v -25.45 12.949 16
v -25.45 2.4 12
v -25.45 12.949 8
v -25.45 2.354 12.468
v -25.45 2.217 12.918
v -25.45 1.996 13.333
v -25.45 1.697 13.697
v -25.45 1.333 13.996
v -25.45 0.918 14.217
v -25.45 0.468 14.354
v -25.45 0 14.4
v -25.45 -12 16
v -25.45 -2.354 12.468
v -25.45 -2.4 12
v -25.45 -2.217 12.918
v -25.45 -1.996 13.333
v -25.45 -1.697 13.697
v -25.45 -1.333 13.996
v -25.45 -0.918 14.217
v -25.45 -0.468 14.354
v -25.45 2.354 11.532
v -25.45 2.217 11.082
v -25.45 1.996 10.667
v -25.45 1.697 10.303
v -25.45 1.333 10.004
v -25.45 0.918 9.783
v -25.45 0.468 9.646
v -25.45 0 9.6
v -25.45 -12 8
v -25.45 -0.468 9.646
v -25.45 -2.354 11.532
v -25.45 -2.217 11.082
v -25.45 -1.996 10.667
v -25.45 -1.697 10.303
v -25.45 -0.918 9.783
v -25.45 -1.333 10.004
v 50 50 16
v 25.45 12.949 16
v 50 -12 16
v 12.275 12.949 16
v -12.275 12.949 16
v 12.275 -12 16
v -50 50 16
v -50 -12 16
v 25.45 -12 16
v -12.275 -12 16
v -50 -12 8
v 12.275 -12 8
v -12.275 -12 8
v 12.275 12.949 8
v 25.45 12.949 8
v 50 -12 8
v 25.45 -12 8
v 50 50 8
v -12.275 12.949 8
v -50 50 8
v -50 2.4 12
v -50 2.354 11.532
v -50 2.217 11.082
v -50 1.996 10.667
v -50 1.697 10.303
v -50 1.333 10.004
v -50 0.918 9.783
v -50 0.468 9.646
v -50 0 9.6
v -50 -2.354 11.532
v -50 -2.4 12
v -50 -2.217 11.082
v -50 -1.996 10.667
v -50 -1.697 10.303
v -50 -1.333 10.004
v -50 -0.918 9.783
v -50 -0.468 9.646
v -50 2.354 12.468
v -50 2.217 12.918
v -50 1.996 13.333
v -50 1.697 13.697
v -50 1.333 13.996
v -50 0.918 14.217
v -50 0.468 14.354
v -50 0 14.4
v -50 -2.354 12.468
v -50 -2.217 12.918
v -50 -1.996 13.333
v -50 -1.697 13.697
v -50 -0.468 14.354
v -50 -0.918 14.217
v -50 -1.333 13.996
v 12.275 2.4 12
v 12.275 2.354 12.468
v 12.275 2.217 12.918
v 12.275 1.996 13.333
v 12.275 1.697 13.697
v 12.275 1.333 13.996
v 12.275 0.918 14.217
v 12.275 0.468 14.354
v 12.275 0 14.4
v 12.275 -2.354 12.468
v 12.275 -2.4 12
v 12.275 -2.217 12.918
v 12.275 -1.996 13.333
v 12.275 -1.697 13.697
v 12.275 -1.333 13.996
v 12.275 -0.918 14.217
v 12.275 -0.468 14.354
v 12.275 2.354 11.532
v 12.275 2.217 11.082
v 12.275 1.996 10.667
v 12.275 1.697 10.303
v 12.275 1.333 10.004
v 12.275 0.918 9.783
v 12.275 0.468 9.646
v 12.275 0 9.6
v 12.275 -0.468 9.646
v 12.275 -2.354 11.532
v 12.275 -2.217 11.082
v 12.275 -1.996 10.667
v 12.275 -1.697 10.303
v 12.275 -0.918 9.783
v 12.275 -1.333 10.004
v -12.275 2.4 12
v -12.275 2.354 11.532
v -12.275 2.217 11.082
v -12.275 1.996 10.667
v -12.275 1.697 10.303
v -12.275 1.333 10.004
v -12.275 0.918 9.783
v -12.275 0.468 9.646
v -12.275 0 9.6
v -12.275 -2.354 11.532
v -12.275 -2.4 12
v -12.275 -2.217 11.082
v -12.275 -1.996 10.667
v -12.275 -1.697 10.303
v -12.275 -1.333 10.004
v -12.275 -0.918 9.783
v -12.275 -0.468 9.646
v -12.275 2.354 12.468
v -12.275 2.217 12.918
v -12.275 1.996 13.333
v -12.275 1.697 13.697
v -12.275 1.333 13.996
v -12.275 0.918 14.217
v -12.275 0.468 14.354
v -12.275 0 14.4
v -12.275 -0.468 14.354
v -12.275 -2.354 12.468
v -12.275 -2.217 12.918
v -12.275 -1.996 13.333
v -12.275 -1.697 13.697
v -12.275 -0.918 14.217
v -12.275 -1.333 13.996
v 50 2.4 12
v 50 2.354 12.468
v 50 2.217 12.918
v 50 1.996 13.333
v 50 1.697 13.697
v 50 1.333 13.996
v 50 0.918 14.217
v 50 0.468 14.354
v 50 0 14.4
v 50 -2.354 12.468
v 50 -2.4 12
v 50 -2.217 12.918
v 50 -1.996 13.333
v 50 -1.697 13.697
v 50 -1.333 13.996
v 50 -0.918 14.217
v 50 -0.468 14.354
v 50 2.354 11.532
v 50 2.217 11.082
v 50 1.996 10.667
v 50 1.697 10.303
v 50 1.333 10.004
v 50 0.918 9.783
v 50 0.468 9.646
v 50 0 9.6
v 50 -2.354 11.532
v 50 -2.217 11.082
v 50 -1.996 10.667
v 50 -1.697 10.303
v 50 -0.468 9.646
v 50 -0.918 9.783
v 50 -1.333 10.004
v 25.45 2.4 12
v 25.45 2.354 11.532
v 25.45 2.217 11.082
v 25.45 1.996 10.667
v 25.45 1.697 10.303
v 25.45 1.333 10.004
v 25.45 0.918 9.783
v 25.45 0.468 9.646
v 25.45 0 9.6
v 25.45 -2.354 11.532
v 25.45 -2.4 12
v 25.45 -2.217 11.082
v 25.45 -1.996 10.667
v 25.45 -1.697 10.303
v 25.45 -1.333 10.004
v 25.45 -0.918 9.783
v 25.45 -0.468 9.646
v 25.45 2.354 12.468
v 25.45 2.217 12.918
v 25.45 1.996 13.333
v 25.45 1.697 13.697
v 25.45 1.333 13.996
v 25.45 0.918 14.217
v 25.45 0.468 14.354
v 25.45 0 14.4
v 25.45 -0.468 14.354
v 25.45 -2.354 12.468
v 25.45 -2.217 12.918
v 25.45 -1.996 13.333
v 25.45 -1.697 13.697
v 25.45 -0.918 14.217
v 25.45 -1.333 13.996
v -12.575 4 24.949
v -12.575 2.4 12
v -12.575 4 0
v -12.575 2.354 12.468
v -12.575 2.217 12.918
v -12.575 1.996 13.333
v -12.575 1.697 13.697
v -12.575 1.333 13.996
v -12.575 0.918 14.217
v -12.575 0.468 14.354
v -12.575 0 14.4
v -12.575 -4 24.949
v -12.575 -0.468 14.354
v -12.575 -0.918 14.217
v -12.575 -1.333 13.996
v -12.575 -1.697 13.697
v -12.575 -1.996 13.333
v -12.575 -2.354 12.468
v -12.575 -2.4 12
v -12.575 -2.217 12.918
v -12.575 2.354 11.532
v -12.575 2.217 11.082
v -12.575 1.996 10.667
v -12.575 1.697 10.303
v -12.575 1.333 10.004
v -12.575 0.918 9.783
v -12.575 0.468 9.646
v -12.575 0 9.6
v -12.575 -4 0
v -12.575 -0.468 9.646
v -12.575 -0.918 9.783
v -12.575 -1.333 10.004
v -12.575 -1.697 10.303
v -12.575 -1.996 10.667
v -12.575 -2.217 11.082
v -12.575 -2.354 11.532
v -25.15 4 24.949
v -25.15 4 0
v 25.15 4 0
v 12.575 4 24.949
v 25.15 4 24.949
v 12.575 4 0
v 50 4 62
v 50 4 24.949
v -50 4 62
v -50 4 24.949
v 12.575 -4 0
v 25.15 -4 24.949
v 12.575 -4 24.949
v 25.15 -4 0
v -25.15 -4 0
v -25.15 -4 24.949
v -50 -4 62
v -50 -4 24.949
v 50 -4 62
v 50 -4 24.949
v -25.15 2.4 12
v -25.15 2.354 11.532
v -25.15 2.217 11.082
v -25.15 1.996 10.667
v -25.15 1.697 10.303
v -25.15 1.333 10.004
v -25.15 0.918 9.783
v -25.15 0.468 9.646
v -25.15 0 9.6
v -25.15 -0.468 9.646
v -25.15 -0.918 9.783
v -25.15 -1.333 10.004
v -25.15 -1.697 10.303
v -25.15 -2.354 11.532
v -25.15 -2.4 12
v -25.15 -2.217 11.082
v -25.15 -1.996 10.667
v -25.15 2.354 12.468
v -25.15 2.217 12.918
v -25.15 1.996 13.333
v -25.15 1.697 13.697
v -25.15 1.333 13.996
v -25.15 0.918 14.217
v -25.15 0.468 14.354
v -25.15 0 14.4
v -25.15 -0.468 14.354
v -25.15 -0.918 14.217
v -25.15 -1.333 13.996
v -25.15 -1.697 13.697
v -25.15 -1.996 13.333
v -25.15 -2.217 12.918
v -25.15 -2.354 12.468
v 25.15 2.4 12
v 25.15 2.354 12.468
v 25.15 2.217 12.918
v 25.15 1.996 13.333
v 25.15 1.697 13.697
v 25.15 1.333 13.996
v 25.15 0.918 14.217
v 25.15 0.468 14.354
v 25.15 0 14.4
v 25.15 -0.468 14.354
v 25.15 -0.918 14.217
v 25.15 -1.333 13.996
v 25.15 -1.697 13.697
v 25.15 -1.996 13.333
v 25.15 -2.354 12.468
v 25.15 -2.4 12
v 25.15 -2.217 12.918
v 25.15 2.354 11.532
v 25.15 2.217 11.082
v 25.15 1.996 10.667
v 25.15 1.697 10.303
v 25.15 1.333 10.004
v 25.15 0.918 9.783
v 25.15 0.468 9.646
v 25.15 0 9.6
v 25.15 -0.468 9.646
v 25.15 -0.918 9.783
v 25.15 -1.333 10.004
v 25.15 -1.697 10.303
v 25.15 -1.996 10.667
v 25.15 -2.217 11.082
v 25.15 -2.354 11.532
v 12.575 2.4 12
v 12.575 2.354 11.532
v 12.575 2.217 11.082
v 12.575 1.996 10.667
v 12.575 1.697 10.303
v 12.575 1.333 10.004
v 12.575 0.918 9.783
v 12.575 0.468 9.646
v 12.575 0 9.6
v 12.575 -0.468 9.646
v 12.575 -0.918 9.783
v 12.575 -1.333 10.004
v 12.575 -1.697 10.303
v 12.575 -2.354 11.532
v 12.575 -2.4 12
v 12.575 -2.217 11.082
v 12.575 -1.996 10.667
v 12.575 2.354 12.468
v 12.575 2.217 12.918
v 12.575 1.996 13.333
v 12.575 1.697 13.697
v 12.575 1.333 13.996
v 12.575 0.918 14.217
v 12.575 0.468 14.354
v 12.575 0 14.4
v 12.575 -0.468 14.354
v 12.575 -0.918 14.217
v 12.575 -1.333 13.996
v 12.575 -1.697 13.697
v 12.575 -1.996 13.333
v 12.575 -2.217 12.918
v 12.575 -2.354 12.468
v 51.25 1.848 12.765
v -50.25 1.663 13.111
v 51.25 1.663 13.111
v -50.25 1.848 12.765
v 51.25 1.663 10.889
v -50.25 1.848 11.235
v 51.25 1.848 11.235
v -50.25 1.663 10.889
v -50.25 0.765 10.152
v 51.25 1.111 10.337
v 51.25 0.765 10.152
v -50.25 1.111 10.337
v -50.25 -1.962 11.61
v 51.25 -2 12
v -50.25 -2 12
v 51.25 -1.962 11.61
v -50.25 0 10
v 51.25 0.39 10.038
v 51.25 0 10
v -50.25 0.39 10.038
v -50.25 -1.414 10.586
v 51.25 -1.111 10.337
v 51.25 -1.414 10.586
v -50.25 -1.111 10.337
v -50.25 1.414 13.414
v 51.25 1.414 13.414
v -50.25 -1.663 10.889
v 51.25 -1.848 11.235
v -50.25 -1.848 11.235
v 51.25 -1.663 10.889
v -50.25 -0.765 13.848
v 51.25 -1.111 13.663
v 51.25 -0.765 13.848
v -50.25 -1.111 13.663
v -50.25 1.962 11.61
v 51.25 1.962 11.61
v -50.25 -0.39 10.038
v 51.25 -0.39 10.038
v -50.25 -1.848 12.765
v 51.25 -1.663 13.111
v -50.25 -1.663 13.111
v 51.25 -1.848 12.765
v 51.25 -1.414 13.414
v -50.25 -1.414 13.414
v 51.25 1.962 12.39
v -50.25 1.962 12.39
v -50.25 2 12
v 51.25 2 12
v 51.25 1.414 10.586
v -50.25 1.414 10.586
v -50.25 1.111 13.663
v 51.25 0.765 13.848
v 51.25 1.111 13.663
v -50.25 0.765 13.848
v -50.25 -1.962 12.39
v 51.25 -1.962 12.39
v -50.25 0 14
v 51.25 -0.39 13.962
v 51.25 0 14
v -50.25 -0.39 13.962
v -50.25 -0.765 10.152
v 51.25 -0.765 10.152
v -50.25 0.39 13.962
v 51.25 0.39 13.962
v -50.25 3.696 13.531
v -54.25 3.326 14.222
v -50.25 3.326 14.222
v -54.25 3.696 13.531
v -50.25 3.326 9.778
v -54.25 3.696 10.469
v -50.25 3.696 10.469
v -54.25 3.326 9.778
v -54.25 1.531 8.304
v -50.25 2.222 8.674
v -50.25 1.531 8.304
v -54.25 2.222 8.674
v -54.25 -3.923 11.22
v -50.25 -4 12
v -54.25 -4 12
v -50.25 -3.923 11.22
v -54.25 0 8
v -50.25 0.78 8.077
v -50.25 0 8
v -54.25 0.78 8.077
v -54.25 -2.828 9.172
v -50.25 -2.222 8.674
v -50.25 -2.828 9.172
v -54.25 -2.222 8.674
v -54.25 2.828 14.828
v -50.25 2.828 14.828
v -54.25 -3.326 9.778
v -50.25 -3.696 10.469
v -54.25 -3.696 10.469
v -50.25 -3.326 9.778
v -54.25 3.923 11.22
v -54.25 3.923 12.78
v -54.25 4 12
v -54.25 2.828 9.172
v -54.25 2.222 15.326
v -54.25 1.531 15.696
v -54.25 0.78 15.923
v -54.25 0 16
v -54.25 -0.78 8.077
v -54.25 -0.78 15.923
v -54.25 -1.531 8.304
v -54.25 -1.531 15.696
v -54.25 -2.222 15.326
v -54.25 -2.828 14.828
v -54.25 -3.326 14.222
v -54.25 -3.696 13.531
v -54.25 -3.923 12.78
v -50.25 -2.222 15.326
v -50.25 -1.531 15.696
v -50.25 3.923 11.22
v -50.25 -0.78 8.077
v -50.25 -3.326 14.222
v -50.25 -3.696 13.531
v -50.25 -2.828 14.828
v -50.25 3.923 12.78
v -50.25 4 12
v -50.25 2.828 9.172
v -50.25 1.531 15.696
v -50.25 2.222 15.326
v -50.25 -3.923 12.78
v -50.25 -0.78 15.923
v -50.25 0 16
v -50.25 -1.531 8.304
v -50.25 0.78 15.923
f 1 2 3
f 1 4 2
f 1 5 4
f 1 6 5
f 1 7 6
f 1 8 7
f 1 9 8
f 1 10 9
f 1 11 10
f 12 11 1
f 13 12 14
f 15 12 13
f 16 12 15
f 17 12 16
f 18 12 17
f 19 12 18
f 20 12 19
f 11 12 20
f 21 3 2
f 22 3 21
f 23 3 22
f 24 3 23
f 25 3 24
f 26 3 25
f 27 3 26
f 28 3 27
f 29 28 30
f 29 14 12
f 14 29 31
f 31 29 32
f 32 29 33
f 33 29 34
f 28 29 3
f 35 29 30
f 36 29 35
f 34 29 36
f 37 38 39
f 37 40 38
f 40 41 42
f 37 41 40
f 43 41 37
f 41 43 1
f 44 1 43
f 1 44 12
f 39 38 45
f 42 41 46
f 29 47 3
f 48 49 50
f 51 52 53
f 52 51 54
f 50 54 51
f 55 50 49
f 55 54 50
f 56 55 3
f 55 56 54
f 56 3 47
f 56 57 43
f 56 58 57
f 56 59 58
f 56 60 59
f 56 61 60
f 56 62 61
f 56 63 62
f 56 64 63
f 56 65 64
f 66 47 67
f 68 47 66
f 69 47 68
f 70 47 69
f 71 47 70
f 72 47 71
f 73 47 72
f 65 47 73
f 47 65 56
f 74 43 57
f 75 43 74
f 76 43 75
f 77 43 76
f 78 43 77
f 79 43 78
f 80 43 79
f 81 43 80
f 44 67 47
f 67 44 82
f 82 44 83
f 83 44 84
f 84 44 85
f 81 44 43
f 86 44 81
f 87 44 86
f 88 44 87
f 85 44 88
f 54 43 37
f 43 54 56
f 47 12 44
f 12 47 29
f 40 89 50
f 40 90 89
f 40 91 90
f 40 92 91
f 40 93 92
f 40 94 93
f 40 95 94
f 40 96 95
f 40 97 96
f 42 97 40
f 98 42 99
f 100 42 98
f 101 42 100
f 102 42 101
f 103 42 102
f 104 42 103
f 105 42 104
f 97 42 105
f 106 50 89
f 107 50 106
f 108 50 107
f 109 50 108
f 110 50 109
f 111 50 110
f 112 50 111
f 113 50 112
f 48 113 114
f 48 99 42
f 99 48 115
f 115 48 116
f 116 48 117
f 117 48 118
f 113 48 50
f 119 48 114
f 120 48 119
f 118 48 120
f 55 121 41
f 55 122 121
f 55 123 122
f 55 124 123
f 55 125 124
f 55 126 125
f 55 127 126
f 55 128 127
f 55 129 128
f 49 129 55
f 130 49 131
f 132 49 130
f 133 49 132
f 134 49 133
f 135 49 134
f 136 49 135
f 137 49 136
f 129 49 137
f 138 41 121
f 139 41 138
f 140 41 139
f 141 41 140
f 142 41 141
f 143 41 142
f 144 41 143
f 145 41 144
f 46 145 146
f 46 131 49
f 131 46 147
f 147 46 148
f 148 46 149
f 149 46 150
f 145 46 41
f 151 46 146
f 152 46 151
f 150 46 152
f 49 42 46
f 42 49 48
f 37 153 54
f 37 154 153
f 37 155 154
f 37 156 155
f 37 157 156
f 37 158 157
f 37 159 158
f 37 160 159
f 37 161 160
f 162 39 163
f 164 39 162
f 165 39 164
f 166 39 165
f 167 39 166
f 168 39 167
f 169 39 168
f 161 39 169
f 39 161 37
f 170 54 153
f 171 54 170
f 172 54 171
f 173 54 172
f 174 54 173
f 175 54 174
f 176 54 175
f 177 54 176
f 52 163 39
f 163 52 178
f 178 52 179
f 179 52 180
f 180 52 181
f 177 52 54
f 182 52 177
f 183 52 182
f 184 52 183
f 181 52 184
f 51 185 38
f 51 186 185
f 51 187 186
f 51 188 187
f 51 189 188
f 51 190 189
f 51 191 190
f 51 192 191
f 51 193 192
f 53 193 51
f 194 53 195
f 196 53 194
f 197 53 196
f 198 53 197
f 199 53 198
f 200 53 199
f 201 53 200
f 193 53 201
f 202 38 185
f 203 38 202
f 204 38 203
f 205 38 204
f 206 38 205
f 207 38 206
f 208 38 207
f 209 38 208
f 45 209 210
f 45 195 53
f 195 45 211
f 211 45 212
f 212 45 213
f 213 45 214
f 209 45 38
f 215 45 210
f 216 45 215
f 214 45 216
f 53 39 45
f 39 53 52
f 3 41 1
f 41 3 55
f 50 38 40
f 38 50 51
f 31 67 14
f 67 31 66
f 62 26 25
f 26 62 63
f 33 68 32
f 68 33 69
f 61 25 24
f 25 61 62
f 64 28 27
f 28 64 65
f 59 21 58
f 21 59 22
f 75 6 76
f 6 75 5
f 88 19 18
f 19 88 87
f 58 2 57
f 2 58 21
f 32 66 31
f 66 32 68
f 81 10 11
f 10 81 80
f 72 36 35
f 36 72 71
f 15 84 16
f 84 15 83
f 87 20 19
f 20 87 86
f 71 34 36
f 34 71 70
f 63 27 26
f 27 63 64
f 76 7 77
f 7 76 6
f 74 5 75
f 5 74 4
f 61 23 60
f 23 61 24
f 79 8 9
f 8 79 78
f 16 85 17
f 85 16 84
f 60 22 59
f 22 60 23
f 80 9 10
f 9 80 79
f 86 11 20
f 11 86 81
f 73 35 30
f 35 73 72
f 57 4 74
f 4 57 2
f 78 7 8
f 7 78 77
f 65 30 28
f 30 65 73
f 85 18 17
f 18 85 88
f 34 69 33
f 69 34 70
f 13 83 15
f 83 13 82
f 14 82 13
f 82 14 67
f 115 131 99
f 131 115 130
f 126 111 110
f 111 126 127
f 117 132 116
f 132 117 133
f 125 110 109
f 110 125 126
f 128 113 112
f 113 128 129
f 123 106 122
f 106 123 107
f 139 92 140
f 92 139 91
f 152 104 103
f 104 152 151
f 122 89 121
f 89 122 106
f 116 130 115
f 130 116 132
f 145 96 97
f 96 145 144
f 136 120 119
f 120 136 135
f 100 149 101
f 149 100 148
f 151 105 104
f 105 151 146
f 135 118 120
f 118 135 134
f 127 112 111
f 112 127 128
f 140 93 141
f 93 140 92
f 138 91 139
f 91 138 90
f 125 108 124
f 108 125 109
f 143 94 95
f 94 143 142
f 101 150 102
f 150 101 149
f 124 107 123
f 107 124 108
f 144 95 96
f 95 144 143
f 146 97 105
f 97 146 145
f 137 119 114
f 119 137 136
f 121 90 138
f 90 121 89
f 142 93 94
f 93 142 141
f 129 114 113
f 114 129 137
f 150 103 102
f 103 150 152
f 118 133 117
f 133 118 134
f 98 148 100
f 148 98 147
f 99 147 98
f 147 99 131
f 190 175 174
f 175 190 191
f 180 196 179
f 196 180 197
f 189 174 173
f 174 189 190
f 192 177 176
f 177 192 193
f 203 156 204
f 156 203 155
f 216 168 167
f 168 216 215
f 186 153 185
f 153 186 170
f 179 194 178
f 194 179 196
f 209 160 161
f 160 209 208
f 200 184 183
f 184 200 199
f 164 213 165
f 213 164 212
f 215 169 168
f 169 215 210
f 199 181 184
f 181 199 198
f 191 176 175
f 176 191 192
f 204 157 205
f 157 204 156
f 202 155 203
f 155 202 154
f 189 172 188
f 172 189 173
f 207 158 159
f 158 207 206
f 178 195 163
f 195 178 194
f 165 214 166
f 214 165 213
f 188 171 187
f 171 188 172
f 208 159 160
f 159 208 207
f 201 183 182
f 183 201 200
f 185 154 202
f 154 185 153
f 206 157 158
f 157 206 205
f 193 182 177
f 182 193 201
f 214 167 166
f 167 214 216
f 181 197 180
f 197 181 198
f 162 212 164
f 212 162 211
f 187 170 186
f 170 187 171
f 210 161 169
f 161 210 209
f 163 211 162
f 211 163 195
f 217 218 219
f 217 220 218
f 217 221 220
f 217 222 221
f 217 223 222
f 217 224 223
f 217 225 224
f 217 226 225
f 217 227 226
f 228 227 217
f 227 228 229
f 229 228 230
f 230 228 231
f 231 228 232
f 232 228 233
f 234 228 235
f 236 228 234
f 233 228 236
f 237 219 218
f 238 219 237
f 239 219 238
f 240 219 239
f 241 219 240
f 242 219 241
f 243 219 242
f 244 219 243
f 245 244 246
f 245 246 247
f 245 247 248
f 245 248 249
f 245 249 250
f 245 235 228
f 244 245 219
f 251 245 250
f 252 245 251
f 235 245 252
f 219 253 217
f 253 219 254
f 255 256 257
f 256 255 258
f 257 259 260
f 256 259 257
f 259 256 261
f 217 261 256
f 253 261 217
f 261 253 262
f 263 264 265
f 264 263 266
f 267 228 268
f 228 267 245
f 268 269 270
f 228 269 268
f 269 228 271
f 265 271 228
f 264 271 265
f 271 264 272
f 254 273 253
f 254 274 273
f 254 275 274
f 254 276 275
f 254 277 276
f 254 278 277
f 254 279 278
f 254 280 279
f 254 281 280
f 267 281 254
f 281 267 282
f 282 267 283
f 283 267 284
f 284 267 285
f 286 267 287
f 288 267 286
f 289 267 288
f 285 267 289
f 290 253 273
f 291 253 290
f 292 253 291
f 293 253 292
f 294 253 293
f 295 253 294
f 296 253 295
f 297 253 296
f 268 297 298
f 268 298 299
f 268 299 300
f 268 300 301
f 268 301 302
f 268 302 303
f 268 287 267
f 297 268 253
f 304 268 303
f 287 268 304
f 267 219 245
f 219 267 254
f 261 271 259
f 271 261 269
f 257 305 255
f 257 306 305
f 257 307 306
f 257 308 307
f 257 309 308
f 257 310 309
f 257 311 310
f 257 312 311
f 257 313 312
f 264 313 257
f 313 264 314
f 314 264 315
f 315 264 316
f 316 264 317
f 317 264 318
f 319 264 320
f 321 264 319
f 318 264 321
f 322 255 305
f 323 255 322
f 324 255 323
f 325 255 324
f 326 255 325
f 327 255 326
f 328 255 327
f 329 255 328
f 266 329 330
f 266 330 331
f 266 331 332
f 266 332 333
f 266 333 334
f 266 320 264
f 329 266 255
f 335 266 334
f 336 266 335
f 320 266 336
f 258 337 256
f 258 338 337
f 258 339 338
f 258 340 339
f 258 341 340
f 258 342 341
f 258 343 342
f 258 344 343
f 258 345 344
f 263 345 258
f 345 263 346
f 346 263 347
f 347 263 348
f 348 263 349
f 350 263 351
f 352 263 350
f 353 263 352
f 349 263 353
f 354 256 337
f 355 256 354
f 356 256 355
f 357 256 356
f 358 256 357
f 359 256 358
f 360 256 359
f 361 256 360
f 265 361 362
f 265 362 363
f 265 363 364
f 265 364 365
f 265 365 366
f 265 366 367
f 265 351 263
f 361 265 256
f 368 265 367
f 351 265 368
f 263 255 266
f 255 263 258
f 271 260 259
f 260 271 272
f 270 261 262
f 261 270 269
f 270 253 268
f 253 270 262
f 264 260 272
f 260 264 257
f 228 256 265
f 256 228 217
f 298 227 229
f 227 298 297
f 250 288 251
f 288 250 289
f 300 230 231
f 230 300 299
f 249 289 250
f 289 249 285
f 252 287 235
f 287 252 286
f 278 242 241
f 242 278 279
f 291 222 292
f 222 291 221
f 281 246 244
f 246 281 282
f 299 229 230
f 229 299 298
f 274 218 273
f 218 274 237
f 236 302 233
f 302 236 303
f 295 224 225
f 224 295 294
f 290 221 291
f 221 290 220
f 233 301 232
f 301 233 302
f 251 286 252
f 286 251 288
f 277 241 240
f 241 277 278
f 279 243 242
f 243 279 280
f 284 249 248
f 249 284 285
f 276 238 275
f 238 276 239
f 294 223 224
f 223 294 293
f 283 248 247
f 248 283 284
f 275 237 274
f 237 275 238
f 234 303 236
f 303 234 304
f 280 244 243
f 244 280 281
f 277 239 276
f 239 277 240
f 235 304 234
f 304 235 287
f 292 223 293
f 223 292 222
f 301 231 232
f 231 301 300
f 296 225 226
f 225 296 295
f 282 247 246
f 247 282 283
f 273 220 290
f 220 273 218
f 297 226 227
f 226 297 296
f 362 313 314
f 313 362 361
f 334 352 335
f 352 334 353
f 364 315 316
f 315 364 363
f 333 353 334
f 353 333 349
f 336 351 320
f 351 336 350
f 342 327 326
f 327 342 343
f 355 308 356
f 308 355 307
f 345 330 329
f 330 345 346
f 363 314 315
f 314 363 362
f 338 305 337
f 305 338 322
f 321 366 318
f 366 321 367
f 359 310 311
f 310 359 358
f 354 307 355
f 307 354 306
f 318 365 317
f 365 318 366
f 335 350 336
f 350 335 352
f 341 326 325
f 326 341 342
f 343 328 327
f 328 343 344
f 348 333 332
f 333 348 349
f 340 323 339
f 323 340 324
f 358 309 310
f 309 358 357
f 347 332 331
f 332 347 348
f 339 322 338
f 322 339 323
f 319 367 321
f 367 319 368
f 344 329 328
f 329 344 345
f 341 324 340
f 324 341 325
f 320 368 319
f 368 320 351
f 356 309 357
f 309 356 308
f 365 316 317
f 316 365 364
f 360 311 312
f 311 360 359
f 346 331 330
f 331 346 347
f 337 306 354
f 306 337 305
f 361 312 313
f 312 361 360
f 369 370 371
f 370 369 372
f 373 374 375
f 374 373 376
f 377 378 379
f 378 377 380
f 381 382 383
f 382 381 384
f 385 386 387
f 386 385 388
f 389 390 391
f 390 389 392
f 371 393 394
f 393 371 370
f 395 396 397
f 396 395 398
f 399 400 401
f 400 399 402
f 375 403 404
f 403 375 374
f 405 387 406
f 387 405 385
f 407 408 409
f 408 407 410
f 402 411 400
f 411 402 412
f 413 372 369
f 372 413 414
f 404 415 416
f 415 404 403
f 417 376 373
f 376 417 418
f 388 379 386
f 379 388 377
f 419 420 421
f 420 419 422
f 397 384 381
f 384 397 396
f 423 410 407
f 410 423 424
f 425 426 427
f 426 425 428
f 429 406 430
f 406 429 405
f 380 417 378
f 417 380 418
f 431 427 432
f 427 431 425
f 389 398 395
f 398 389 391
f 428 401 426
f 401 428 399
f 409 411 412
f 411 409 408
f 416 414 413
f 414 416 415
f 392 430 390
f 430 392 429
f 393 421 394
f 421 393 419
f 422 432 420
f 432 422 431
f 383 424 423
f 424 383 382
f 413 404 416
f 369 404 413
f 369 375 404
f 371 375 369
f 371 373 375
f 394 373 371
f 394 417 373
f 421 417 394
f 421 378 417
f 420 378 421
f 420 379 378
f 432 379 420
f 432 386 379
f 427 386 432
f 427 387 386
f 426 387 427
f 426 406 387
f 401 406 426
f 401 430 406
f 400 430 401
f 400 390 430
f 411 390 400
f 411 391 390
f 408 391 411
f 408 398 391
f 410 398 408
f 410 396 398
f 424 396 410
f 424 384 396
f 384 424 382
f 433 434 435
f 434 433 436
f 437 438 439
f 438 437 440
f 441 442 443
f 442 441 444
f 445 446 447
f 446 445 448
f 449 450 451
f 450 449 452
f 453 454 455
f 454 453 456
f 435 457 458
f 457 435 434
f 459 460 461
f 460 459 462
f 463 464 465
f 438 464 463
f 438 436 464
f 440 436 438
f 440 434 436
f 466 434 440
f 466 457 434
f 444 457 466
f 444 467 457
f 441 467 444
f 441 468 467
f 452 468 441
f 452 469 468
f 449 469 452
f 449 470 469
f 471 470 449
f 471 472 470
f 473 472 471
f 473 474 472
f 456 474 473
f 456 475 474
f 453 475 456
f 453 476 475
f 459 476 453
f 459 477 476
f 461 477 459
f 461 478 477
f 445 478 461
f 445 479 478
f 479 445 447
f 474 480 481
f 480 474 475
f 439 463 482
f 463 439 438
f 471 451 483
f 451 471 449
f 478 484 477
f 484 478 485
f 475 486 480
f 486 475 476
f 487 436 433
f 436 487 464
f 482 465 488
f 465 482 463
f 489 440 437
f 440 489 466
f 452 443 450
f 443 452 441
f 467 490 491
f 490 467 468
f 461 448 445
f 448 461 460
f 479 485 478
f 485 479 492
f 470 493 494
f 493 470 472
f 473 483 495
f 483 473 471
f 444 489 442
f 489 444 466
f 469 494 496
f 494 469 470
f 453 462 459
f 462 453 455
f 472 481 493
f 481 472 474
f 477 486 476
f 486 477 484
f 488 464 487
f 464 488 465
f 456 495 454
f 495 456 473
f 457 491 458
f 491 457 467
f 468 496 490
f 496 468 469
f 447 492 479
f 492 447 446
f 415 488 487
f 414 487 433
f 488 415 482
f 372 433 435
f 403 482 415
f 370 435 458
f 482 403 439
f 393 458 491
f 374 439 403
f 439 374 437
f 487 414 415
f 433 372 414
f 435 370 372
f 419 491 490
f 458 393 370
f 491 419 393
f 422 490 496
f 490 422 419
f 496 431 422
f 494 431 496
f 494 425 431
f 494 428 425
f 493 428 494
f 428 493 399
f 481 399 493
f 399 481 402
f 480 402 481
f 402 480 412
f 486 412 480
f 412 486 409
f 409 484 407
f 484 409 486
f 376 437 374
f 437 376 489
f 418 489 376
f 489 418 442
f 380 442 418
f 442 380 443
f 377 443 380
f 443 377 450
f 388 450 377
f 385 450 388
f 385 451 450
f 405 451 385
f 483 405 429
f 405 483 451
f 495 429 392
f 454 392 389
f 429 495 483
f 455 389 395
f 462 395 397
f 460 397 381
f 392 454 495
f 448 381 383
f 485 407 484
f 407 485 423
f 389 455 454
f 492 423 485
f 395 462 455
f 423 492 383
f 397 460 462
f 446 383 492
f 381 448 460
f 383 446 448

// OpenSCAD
$fn = 32;

// ------------------------------------------------------------------------
// Butt hinge: hinge 100 mm, leaf swung 270 deg
// Every part is its own module, assembly() places every instance.
// ------------------------------------------------------------------------

// --- part 1 ---
module hinge_base() {
  difference() {
    union() {
      translate([-50, -12, -4]) cube([24.55, 62, 8]);
      translate([-12.275, -12, -4]) cube([24.55, 62, 8]);
      translate([25.45, -12, -4]) cube([24.55, 62, 8]);
      translate([-50, 12.949, -4]) cube([100, 37.051, 8]);
    }
    translate([-37.725, 0, 0]) rotate([0, 90, 0]) cylinder(h = 26.55, d = 4.8, center = true);
    translate([0, 0, 0]) rotate([0, 90, 0]) cylinder(h = 26.55, d = 4.8, center = true);
    translate([37.725, 0, 0]) rotate([0, 90, 0]) cylinder(h = 26.55, d = 4.8, center = true);
  }
}

// --- part 2 ---
module hinge_mover() {
  difference() {
    union() {
      translate([-25.15, -50, -4]) cube([12.575, 62, 8]);
      translate([12.575, -50, -4]) cube([12.575, 62, 8]);
      translate([-50, -50, -4]) cube([100, 37.051, 8]);
    }
    translate([-18.863, 0, 0]) rotate([0, 90, 0]) cylinder(h = 14.575, d = 4.8, center = true);
    translate([18.863, 0, 0]) rotate([0, 90, 0]) cylinder(h = 14.575, d = 4.8, center = true);
  }
}

// --- part 3 ---
module hinge_pin() {
  rotate([0, 90, 0]) cylinder(h = 102.5, d = 4, center = true);
  translate([-54.25, 0, 0]) rotate([0, 90, 0]) cylinder(h = 4, d = 8);
}

// --- assembly ---
module assembly() {
  color([0.80, 0.24, 0.20]) translate([0, 0, 12]) rotate([0, 0, 0]) hinge_base();
  color([0.20, 0.45, 0.75]) translate([0, 0, 12]) rotate([270, 0, 0]) hinge_mover();
  color([0.25, 0.62, 0.32]) translate([0, 0, 12]) rotate([0, 0, 0]) hinge_pin();
}

assembly();
